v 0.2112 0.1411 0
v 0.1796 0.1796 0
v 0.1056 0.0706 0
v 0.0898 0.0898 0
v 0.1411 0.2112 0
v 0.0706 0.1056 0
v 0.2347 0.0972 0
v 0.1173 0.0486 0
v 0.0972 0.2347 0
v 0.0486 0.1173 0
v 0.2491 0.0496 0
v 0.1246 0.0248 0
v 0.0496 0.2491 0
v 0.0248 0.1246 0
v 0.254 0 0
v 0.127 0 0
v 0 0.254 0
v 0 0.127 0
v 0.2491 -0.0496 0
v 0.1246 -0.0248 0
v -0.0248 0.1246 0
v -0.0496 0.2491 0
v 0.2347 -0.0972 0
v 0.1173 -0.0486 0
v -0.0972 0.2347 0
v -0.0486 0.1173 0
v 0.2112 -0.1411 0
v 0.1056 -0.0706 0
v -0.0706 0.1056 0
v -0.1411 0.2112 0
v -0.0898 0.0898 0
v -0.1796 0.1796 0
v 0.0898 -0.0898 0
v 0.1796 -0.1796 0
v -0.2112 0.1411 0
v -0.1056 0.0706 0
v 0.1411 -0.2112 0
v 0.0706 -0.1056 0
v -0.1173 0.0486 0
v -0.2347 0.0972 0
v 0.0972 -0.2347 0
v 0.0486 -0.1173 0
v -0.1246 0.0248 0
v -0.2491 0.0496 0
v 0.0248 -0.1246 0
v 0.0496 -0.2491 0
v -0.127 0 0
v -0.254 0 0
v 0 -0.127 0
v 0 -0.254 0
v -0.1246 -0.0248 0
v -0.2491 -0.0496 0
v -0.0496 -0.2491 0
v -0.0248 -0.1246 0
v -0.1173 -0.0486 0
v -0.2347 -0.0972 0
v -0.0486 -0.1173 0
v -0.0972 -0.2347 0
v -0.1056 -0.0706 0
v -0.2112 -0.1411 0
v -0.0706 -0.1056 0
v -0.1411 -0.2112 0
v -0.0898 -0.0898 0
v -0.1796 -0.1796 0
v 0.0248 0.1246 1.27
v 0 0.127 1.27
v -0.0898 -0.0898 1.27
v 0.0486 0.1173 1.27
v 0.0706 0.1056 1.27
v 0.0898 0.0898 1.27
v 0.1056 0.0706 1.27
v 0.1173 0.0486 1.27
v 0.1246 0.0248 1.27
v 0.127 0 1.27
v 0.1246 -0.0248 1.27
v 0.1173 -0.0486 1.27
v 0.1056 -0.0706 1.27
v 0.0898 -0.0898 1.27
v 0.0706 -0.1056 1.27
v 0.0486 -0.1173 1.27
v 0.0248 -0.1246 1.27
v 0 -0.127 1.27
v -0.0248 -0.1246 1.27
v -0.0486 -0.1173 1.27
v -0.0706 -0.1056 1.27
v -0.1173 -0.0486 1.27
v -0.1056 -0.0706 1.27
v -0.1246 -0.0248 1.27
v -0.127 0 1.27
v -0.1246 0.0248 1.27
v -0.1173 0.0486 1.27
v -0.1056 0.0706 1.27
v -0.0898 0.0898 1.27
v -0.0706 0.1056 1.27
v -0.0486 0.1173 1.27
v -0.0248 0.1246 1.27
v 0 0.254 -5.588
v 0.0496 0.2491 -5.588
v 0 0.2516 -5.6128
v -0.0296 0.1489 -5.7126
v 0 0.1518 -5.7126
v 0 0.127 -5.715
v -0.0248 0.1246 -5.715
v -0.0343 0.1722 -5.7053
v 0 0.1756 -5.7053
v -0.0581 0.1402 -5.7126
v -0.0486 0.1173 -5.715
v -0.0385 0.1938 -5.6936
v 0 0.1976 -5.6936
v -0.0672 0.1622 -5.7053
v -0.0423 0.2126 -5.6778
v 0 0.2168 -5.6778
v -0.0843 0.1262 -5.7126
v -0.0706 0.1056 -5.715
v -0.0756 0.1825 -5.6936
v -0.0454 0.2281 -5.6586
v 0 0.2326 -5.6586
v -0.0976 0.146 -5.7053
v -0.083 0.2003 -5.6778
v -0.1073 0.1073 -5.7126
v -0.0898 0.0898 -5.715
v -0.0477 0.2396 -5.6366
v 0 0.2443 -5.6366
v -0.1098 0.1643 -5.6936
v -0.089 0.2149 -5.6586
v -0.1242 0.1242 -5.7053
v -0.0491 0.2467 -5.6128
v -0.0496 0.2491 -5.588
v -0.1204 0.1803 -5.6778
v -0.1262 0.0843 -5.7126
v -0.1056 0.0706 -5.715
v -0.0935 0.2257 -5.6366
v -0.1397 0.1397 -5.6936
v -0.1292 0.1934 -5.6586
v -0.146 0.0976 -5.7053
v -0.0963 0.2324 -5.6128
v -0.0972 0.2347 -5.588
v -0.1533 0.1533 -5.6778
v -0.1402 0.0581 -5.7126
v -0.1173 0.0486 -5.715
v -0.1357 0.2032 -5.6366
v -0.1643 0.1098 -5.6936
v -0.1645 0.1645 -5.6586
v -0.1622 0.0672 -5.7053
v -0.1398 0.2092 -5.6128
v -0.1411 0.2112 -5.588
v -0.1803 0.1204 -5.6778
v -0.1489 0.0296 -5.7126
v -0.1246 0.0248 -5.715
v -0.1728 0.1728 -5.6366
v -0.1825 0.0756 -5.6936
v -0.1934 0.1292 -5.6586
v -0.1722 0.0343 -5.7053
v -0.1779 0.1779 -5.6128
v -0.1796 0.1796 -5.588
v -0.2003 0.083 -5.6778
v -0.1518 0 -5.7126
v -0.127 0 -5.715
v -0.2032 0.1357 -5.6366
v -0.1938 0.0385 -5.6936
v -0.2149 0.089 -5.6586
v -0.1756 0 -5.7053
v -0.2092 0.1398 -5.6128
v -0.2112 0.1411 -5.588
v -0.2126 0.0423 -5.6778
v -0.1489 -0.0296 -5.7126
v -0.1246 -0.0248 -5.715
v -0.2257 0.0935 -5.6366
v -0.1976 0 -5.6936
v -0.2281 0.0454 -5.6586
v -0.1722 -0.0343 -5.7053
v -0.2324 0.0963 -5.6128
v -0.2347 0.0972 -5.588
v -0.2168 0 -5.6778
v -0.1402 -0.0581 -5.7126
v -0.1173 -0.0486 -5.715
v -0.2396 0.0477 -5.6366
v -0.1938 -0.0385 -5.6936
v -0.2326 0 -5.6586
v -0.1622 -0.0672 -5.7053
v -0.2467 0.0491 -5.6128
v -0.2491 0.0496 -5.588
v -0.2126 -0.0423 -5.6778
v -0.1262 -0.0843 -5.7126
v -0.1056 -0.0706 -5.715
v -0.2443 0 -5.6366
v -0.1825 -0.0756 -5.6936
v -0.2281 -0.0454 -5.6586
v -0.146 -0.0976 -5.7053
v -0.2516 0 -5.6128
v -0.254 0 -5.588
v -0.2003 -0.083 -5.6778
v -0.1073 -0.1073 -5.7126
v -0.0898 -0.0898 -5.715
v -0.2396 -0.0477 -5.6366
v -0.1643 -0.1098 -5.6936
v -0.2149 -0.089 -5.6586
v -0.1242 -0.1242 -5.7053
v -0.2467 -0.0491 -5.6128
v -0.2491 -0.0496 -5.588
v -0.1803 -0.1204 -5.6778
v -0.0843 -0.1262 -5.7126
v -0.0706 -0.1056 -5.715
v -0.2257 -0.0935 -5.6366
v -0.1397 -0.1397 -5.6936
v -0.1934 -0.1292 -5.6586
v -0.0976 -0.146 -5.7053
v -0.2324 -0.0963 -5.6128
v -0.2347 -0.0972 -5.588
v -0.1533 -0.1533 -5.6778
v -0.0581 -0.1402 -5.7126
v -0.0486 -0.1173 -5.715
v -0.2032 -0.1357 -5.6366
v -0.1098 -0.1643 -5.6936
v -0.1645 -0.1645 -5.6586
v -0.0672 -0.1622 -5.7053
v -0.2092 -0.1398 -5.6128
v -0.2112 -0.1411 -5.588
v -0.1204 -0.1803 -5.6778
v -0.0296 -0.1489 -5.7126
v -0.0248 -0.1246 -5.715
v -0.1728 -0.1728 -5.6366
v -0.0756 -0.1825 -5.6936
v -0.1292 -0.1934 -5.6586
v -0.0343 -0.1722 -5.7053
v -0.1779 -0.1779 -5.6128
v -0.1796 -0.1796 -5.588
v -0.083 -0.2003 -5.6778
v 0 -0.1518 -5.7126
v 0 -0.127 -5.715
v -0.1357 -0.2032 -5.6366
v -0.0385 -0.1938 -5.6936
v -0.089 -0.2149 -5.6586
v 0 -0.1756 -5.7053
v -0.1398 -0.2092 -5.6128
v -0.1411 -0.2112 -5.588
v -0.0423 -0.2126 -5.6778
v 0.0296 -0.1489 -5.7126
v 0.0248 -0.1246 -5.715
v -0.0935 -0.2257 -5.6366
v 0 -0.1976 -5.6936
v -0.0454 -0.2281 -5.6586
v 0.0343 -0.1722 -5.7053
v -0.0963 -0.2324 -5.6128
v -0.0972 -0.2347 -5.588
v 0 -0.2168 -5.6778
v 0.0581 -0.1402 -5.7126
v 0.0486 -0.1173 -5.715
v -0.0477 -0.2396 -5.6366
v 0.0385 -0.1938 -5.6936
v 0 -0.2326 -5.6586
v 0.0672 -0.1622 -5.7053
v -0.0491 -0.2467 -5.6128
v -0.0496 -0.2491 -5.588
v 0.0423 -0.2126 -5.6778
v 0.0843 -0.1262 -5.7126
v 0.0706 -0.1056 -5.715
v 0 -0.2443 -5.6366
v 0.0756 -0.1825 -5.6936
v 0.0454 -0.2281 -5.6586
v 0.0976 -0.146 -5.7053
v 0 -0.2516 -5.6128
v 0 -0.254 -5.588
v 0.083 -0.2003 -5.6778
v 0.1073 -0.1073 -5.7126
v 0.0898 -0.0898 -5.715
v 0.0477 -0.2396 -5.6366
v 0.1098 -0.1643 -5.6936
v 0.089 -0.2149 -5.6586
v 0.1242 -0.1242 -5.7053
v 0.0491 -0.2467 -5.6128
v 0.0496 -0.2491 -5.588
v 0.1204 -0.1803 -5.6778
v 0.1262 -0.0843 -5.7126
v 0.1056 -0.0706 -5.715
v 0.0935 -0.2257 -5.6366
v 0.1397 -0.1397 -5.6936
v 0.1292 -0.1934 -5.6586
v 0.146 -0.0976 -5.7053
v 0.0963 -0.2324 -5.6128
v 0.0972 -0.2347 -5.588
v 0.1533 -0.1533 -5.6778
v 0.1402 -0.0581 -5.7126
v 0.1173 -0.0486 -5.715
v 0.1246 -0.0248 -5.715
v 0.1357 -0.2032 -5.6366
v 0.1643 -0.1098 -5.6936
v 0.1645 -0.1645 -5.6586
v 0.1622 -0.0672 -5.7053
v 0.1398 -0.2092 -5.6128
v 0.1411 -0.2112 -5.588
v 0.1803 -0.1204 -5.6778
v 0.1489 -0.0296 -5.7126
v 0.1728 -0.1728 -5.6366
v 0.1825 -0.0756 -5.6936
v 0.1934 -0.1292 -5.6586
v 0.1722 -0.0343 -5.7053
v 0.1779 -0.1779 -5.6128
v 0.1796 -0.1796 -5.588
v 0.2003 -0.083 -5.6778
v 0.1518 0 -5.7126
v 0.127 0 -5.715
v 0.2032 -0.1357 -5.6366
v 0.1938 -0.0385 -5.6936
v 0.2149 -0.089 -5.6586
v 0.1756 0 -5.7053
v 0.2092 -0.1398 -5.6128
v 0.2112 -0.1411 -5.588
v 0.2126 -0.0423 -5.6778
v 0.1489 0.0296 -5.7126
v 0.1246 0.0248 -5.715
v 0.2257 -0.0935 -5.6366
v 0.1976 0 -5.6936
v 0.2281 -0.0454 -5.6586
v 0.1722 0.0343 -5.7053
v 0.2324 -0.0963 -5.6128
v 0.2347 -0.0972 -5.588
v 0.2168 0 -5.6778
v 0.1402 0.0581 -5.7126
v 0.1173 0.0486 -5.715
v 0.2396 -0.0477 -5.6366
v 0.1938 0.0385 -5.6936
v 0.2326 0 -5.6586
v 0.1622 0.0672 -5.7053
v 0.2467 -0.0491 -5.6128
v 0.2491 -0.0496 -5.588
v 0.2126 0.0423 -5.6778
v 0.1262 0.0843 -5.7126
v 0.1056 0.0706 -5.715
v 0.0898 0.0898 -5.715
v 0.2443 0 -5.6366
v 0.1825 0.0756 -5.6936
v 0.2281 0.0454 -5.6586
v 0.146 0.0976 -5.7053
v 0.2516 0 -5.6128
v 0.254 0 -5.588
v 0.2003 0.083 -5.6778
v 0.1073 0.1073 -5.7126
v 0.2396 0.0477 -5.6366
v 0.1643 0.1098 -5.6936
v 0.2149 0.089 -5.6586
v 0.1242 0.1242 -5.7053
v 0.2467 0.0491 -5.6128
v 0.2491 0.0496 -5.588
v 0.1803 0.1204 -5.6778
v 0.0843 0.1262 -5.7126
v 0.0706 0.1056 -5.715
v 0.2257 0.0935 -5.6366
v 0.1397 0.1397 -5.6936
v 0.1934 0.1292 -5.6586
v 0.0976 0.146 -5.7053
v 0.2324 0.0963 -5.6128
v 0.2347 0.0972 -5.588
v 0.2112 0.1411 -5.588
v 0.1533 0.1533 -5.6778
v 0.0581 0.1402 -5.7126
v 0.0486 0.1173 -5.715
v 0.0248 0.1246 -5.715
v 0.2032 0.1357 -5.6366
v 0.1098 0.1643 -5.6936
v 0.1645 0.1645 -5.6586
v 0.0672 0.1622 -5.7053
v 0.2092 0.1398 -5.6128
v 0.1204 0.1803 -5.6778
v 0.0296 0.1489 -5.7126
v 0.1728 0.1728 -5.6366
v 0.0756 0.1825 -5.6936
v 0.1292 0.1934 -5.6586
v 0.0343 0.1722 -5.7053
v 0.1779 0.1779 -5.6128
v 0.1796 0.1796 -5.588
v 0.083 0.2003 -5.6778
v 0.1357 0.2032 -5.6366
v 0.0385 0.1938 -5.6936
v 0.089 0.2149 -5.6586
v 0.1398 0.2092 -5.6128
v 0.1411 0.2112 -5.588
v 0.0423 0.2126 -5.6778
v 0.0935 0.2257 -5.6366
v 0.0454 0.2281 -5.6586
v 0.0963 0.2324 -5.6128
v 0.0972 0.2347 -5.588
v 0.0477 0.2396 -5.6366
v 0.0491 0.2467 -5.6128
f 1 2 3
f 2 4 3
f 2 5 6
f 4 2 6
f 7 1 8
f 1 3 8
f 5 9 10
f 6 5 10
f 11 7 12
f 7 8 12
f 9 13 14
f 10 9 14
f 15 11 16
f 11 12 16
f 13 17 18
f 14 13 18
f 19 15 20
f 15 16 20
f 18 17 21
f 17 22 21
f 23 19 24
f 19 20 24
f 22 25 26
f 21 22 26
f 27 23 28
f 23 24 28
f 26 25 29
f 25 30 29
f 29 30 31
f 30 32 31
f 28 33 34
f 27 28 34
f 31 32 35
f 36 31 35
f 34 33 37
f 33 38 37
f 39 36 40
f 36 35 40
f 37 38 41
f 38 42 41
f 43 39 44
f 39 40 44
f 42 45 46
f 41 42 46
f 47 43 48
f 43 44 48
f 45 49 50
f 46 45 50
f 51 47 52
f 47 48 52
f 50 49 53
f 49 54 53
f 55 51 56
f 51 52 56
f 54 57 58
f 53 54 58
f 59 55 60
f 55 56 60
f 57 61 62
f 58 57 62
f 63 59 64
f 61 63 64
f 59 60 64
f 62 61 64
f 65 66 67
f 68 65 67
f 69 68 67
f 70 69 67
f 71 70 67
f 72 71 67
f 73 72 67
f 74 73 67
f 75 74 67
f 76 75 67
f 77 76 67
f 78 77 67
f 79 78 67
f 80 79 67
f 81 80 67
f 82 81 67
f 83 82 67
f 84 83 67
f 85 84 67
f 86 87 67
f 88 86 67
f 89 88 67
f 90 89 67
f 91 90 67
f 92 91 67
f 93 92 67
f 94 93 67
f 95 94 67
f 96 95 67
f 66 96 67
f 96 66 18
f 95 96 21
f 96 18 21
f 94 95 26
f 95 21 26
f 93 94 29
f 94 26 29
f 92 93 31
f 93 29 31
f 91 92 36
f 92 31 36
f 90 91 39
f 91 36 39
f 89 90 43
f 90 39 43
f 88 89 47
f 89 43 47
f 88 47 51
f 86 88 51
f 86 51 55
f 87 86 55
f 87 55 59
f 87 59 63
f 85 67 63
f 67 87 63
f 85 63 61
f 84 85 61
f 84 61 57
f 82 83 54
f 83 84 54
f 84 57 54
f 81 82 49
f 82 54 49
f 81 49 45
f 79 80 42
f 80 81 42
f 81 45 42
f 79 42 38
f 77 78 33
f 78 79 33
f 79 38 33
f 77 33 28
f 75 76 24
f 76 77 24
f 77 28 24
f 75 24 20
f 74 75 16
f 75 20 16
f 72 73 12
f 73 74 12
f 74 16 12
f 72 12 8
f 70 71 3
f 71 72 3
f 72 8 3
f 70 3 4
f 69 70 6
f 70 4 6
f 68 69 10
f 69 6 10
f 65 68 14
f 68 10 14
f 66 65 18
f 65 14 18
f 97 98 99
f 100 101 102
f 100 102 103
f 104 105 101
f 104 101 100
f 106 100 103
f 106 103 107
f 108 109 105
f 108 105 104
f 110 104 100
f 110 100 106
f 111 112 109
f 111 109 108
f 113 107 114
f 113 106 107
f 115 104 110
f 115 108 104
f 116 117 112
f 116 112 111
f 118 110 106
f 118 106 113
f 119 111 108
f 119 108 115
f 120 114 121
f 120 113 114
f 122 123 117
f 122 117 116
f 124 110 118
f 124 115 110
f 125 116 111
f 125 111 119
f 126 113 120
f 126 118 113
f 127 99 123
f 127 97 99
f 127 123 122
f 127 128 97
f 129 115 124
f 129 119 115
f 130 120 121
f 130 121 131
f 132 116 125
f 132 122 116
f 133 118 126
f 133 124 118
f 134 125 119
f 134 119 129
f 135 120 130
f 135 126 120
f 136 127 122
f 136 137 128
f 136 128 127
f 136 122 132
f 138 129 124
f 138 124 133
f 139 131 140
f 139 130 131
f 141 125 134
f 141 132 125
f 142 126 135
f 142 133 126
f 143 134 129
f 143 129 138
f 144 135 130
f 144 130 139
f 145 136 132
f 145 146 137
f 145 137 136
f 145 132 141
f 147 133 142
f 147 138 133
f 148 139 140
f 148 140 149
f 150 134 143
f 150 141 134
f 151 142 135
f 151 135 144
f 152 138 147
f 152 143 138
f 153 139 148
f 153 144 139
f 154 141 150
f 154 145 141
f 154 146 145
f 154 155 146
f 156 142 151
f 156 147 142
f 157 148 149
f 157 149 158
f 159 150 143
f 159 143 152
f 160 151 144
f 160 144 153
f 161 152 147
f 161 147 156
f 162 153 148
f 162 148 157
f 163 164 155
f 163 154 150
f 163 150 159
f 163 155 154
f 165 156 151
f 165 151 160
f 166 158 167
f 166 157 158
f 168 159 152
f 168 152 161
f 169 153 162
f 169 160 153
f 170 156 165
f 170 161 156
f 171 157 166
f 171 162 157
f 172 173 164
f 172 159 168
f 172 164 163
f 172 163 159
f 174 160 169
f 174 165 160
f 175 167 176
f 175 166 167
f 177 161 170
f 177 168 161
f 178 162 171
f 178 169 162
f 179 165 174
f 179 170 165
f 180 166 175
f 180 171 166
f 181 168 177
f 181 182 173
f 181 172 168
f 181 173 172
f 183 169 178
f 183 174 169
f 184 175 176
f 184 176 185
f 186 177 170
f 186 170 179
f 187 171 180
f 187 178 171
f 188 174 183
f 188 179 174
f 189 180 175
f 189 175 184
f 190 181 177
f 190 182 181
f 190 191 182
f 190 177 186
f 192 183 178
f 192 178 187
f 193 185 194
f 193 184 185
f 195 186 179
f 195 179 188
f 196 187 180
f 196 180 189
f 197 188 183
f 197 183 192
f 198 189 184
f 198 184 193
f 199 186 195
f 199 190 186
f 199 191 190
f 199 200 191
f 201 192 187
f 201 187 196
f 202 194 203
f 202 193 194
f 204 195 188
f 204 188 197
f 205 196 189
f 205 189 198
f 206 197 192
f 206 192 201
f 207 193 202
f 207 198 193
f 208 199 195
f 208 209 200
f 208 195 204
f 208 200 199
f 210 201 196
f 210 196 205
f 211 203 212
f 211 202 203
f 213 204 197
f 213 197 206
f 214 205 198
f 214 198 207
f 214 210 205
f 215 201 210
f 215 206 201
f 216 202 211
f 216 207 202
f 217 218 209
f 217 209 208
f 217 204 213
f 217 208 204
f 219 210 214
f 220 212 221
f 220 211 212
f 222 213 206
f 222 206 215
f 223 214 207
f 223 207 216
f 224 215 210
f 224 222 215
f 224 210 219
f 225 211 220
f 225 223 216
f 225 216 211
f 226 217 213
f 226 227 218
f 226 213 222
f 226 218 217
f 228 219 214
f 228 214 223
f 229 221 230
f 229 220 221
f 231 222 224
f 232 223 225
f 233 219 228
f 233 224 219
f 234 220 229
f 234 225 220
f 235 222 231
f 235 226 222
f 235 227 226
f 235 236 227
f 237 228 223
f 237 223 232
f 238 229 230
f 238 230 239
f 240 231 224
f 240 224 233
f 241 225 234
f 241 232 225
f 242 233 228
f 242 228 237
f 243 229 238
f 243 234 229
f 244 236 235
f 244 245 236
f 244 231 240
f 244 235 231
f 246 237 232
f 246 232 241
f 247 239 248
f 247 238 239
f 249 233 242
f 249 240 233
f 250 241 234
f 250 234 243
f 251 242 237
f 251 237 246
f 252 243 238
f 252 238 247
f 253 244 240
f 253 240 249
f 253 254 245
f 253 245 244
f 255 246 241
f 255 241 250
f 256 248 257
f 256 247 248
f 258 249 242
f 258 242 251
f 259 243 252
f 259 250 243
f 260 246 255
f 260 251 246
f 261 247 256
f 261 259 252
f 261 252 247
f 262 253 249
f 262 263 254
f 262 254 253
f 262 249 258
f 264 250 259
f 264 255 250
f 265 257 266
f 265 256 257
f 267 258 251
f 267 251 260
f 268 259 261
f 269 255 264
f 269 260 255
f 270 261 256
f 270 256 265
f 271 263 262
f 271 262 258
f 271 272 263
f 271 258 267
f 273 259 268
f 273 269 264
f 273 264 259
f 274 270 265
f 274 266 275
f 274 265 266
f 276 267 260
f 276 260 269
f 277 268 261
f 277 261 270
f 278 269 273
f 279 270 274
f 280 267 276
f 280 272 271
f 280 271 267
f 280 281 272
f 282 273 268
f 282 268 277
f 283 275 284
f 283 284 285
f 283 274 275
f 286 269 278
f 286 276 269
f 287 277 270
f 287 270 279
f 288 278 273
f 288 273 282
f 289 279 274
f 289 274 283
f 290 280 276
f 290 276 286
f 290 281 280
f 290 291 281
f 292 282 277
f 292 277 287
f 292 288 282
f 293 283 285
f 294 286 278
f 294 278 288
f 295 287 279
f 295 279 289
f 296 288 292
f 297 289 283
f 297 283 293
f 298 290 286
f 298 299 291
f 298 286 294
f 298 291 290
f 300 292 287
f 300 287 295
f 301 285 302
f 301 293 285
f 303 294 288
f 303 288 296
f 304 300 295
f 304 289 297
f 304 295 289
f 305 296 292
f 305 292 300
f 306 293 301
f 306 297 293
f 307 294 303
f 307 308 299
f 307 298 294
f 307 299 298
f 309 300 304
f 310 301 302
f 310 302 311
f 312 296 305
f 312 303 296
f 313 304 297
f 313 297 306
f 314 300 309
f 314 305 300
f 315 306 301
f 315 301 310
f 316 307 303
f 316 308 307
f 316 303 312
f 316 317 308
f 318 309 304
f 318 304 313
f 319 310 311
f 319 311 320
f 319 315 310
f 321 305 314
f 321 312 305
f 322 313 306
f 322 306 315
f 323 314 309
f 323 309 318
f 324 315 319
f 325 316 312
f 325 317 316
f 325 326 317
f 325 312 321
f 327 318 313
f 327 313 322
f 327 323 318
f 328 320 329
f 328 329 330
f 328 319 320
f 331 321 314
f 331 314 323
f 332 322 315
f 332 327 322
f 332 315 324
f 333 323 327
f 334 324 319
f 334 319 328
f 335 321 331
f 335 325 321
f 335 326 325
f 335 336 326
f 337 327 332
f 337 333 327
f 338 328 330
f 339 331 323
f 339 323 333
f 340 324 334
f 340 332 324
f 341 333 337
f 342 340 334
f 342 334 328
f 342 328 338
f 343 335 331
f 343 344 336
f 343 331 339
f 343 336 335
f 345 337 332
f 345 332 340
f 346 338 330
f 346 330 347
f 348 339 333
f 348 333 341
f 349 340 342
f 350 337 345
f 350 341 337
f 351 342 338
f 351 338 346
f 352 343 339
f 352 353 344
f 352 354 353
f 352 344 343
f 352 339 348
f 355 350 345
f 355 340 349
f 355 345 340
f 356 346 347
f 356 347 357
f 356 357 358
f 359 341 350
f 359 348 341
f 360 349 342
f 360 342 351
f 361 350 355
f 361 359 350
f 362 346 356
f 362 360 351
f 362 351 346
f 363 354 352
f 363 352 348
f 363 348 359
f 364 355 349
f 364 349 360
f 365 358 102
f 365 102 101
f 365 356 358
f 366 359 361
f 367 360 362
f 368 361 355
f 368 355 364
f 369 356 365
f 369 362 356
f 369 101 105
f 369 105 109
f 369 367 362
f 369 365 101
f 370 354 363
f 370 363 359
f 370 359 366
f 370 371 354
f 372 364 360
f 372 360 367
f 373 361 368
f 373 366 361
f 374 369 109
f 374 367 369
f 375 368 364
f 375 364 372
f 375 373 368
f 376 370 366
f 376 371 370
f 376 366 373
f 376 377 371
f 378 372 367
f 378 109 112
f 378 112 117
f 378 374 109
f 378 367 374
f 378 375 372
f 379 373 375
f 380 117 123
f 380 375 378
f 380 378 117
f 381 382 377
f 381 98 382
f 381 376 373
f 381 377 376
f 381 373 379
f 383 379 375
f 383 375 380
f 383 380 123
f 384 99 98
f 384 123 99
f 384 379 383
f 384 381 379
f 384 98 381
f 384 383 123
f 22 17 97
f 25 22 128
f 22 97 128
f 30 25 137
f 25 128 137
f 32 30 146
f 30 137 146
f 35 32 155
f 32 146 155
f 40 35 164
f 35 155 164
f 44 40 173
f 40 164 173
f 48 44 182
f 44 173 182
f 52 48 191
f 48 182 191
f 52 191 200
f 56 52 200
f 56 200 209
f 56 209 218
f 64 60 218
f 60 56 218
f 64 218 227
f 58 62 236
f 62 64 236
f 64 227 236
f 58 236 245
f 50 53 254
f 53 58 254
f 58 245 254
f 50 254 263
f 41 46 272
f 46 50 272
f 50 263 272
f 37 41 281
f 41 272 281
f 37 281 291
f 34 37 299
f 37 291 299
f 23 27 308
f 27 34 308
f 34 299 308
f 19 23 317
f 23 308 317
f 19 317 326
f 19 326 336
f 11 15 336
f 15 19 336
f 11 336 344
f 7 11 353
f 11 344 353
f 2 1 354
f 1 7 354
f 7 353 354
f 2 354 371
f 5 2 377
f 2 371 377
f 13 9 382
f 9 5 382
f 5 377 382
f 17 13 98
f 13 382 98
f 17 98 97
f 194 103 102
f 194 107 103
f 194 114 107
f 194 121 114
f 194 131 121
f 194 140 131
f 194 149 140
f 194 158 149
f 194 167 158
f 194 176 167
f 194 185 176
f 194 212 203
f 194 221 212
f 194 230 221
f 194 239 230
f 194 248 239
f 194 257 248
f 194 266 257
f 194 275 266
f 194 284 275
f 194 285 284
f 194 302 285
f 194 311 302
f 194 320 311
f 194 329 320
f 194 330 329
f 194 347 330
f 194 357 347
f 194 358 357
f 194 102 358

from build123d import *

# Parameters (mm, degrees)
SKETCH1_W = 6.985
SKETCH1_H = 0.254
FILLET1_R = 0.127
SKETCH3_W = 1.933566412
SKETCH3_H = 0.48292321


with BuildPart() as part:
    # Sketch1 → Revolve1 (revolve)
    with BuildSketch(Plane(origin=(0, 0, 0), x_dir=(0, 0, -1), z_dir=(1, 0, 0))):
        with Locations((2.2225, 0.127)):
            Rectangle(SKETCH1_W, SKETCH1_H)
    revolve(axis=Axis((0, 0, -5.715), (0, 0, 1)))

    # Fillet1
    fillet1_edges = [part.edges().sort_by_distance(p)[0] for p in [
        (0, -0.254, -5.715),
    ]]
    fillet(fillet1_edges, radius=FILLET1_R)

    # Sketch3 → Cut-Revolve1 (revolve, cut)
    with BuildSketch(Plane(origin=(0, 0, 0), x_dir=(0, 0, -1), z_dir=(1, 0, 0))):
        with Locations((-0.966783206, 0.368461605)):
            Rectangle(SKETCH3_W, SKETCH3_H)
    revolve(axis=Axis((0, 0, 1.618934624), (0, 0, 1)), mode=Mode.SUBTRACT)


solid = part.part
